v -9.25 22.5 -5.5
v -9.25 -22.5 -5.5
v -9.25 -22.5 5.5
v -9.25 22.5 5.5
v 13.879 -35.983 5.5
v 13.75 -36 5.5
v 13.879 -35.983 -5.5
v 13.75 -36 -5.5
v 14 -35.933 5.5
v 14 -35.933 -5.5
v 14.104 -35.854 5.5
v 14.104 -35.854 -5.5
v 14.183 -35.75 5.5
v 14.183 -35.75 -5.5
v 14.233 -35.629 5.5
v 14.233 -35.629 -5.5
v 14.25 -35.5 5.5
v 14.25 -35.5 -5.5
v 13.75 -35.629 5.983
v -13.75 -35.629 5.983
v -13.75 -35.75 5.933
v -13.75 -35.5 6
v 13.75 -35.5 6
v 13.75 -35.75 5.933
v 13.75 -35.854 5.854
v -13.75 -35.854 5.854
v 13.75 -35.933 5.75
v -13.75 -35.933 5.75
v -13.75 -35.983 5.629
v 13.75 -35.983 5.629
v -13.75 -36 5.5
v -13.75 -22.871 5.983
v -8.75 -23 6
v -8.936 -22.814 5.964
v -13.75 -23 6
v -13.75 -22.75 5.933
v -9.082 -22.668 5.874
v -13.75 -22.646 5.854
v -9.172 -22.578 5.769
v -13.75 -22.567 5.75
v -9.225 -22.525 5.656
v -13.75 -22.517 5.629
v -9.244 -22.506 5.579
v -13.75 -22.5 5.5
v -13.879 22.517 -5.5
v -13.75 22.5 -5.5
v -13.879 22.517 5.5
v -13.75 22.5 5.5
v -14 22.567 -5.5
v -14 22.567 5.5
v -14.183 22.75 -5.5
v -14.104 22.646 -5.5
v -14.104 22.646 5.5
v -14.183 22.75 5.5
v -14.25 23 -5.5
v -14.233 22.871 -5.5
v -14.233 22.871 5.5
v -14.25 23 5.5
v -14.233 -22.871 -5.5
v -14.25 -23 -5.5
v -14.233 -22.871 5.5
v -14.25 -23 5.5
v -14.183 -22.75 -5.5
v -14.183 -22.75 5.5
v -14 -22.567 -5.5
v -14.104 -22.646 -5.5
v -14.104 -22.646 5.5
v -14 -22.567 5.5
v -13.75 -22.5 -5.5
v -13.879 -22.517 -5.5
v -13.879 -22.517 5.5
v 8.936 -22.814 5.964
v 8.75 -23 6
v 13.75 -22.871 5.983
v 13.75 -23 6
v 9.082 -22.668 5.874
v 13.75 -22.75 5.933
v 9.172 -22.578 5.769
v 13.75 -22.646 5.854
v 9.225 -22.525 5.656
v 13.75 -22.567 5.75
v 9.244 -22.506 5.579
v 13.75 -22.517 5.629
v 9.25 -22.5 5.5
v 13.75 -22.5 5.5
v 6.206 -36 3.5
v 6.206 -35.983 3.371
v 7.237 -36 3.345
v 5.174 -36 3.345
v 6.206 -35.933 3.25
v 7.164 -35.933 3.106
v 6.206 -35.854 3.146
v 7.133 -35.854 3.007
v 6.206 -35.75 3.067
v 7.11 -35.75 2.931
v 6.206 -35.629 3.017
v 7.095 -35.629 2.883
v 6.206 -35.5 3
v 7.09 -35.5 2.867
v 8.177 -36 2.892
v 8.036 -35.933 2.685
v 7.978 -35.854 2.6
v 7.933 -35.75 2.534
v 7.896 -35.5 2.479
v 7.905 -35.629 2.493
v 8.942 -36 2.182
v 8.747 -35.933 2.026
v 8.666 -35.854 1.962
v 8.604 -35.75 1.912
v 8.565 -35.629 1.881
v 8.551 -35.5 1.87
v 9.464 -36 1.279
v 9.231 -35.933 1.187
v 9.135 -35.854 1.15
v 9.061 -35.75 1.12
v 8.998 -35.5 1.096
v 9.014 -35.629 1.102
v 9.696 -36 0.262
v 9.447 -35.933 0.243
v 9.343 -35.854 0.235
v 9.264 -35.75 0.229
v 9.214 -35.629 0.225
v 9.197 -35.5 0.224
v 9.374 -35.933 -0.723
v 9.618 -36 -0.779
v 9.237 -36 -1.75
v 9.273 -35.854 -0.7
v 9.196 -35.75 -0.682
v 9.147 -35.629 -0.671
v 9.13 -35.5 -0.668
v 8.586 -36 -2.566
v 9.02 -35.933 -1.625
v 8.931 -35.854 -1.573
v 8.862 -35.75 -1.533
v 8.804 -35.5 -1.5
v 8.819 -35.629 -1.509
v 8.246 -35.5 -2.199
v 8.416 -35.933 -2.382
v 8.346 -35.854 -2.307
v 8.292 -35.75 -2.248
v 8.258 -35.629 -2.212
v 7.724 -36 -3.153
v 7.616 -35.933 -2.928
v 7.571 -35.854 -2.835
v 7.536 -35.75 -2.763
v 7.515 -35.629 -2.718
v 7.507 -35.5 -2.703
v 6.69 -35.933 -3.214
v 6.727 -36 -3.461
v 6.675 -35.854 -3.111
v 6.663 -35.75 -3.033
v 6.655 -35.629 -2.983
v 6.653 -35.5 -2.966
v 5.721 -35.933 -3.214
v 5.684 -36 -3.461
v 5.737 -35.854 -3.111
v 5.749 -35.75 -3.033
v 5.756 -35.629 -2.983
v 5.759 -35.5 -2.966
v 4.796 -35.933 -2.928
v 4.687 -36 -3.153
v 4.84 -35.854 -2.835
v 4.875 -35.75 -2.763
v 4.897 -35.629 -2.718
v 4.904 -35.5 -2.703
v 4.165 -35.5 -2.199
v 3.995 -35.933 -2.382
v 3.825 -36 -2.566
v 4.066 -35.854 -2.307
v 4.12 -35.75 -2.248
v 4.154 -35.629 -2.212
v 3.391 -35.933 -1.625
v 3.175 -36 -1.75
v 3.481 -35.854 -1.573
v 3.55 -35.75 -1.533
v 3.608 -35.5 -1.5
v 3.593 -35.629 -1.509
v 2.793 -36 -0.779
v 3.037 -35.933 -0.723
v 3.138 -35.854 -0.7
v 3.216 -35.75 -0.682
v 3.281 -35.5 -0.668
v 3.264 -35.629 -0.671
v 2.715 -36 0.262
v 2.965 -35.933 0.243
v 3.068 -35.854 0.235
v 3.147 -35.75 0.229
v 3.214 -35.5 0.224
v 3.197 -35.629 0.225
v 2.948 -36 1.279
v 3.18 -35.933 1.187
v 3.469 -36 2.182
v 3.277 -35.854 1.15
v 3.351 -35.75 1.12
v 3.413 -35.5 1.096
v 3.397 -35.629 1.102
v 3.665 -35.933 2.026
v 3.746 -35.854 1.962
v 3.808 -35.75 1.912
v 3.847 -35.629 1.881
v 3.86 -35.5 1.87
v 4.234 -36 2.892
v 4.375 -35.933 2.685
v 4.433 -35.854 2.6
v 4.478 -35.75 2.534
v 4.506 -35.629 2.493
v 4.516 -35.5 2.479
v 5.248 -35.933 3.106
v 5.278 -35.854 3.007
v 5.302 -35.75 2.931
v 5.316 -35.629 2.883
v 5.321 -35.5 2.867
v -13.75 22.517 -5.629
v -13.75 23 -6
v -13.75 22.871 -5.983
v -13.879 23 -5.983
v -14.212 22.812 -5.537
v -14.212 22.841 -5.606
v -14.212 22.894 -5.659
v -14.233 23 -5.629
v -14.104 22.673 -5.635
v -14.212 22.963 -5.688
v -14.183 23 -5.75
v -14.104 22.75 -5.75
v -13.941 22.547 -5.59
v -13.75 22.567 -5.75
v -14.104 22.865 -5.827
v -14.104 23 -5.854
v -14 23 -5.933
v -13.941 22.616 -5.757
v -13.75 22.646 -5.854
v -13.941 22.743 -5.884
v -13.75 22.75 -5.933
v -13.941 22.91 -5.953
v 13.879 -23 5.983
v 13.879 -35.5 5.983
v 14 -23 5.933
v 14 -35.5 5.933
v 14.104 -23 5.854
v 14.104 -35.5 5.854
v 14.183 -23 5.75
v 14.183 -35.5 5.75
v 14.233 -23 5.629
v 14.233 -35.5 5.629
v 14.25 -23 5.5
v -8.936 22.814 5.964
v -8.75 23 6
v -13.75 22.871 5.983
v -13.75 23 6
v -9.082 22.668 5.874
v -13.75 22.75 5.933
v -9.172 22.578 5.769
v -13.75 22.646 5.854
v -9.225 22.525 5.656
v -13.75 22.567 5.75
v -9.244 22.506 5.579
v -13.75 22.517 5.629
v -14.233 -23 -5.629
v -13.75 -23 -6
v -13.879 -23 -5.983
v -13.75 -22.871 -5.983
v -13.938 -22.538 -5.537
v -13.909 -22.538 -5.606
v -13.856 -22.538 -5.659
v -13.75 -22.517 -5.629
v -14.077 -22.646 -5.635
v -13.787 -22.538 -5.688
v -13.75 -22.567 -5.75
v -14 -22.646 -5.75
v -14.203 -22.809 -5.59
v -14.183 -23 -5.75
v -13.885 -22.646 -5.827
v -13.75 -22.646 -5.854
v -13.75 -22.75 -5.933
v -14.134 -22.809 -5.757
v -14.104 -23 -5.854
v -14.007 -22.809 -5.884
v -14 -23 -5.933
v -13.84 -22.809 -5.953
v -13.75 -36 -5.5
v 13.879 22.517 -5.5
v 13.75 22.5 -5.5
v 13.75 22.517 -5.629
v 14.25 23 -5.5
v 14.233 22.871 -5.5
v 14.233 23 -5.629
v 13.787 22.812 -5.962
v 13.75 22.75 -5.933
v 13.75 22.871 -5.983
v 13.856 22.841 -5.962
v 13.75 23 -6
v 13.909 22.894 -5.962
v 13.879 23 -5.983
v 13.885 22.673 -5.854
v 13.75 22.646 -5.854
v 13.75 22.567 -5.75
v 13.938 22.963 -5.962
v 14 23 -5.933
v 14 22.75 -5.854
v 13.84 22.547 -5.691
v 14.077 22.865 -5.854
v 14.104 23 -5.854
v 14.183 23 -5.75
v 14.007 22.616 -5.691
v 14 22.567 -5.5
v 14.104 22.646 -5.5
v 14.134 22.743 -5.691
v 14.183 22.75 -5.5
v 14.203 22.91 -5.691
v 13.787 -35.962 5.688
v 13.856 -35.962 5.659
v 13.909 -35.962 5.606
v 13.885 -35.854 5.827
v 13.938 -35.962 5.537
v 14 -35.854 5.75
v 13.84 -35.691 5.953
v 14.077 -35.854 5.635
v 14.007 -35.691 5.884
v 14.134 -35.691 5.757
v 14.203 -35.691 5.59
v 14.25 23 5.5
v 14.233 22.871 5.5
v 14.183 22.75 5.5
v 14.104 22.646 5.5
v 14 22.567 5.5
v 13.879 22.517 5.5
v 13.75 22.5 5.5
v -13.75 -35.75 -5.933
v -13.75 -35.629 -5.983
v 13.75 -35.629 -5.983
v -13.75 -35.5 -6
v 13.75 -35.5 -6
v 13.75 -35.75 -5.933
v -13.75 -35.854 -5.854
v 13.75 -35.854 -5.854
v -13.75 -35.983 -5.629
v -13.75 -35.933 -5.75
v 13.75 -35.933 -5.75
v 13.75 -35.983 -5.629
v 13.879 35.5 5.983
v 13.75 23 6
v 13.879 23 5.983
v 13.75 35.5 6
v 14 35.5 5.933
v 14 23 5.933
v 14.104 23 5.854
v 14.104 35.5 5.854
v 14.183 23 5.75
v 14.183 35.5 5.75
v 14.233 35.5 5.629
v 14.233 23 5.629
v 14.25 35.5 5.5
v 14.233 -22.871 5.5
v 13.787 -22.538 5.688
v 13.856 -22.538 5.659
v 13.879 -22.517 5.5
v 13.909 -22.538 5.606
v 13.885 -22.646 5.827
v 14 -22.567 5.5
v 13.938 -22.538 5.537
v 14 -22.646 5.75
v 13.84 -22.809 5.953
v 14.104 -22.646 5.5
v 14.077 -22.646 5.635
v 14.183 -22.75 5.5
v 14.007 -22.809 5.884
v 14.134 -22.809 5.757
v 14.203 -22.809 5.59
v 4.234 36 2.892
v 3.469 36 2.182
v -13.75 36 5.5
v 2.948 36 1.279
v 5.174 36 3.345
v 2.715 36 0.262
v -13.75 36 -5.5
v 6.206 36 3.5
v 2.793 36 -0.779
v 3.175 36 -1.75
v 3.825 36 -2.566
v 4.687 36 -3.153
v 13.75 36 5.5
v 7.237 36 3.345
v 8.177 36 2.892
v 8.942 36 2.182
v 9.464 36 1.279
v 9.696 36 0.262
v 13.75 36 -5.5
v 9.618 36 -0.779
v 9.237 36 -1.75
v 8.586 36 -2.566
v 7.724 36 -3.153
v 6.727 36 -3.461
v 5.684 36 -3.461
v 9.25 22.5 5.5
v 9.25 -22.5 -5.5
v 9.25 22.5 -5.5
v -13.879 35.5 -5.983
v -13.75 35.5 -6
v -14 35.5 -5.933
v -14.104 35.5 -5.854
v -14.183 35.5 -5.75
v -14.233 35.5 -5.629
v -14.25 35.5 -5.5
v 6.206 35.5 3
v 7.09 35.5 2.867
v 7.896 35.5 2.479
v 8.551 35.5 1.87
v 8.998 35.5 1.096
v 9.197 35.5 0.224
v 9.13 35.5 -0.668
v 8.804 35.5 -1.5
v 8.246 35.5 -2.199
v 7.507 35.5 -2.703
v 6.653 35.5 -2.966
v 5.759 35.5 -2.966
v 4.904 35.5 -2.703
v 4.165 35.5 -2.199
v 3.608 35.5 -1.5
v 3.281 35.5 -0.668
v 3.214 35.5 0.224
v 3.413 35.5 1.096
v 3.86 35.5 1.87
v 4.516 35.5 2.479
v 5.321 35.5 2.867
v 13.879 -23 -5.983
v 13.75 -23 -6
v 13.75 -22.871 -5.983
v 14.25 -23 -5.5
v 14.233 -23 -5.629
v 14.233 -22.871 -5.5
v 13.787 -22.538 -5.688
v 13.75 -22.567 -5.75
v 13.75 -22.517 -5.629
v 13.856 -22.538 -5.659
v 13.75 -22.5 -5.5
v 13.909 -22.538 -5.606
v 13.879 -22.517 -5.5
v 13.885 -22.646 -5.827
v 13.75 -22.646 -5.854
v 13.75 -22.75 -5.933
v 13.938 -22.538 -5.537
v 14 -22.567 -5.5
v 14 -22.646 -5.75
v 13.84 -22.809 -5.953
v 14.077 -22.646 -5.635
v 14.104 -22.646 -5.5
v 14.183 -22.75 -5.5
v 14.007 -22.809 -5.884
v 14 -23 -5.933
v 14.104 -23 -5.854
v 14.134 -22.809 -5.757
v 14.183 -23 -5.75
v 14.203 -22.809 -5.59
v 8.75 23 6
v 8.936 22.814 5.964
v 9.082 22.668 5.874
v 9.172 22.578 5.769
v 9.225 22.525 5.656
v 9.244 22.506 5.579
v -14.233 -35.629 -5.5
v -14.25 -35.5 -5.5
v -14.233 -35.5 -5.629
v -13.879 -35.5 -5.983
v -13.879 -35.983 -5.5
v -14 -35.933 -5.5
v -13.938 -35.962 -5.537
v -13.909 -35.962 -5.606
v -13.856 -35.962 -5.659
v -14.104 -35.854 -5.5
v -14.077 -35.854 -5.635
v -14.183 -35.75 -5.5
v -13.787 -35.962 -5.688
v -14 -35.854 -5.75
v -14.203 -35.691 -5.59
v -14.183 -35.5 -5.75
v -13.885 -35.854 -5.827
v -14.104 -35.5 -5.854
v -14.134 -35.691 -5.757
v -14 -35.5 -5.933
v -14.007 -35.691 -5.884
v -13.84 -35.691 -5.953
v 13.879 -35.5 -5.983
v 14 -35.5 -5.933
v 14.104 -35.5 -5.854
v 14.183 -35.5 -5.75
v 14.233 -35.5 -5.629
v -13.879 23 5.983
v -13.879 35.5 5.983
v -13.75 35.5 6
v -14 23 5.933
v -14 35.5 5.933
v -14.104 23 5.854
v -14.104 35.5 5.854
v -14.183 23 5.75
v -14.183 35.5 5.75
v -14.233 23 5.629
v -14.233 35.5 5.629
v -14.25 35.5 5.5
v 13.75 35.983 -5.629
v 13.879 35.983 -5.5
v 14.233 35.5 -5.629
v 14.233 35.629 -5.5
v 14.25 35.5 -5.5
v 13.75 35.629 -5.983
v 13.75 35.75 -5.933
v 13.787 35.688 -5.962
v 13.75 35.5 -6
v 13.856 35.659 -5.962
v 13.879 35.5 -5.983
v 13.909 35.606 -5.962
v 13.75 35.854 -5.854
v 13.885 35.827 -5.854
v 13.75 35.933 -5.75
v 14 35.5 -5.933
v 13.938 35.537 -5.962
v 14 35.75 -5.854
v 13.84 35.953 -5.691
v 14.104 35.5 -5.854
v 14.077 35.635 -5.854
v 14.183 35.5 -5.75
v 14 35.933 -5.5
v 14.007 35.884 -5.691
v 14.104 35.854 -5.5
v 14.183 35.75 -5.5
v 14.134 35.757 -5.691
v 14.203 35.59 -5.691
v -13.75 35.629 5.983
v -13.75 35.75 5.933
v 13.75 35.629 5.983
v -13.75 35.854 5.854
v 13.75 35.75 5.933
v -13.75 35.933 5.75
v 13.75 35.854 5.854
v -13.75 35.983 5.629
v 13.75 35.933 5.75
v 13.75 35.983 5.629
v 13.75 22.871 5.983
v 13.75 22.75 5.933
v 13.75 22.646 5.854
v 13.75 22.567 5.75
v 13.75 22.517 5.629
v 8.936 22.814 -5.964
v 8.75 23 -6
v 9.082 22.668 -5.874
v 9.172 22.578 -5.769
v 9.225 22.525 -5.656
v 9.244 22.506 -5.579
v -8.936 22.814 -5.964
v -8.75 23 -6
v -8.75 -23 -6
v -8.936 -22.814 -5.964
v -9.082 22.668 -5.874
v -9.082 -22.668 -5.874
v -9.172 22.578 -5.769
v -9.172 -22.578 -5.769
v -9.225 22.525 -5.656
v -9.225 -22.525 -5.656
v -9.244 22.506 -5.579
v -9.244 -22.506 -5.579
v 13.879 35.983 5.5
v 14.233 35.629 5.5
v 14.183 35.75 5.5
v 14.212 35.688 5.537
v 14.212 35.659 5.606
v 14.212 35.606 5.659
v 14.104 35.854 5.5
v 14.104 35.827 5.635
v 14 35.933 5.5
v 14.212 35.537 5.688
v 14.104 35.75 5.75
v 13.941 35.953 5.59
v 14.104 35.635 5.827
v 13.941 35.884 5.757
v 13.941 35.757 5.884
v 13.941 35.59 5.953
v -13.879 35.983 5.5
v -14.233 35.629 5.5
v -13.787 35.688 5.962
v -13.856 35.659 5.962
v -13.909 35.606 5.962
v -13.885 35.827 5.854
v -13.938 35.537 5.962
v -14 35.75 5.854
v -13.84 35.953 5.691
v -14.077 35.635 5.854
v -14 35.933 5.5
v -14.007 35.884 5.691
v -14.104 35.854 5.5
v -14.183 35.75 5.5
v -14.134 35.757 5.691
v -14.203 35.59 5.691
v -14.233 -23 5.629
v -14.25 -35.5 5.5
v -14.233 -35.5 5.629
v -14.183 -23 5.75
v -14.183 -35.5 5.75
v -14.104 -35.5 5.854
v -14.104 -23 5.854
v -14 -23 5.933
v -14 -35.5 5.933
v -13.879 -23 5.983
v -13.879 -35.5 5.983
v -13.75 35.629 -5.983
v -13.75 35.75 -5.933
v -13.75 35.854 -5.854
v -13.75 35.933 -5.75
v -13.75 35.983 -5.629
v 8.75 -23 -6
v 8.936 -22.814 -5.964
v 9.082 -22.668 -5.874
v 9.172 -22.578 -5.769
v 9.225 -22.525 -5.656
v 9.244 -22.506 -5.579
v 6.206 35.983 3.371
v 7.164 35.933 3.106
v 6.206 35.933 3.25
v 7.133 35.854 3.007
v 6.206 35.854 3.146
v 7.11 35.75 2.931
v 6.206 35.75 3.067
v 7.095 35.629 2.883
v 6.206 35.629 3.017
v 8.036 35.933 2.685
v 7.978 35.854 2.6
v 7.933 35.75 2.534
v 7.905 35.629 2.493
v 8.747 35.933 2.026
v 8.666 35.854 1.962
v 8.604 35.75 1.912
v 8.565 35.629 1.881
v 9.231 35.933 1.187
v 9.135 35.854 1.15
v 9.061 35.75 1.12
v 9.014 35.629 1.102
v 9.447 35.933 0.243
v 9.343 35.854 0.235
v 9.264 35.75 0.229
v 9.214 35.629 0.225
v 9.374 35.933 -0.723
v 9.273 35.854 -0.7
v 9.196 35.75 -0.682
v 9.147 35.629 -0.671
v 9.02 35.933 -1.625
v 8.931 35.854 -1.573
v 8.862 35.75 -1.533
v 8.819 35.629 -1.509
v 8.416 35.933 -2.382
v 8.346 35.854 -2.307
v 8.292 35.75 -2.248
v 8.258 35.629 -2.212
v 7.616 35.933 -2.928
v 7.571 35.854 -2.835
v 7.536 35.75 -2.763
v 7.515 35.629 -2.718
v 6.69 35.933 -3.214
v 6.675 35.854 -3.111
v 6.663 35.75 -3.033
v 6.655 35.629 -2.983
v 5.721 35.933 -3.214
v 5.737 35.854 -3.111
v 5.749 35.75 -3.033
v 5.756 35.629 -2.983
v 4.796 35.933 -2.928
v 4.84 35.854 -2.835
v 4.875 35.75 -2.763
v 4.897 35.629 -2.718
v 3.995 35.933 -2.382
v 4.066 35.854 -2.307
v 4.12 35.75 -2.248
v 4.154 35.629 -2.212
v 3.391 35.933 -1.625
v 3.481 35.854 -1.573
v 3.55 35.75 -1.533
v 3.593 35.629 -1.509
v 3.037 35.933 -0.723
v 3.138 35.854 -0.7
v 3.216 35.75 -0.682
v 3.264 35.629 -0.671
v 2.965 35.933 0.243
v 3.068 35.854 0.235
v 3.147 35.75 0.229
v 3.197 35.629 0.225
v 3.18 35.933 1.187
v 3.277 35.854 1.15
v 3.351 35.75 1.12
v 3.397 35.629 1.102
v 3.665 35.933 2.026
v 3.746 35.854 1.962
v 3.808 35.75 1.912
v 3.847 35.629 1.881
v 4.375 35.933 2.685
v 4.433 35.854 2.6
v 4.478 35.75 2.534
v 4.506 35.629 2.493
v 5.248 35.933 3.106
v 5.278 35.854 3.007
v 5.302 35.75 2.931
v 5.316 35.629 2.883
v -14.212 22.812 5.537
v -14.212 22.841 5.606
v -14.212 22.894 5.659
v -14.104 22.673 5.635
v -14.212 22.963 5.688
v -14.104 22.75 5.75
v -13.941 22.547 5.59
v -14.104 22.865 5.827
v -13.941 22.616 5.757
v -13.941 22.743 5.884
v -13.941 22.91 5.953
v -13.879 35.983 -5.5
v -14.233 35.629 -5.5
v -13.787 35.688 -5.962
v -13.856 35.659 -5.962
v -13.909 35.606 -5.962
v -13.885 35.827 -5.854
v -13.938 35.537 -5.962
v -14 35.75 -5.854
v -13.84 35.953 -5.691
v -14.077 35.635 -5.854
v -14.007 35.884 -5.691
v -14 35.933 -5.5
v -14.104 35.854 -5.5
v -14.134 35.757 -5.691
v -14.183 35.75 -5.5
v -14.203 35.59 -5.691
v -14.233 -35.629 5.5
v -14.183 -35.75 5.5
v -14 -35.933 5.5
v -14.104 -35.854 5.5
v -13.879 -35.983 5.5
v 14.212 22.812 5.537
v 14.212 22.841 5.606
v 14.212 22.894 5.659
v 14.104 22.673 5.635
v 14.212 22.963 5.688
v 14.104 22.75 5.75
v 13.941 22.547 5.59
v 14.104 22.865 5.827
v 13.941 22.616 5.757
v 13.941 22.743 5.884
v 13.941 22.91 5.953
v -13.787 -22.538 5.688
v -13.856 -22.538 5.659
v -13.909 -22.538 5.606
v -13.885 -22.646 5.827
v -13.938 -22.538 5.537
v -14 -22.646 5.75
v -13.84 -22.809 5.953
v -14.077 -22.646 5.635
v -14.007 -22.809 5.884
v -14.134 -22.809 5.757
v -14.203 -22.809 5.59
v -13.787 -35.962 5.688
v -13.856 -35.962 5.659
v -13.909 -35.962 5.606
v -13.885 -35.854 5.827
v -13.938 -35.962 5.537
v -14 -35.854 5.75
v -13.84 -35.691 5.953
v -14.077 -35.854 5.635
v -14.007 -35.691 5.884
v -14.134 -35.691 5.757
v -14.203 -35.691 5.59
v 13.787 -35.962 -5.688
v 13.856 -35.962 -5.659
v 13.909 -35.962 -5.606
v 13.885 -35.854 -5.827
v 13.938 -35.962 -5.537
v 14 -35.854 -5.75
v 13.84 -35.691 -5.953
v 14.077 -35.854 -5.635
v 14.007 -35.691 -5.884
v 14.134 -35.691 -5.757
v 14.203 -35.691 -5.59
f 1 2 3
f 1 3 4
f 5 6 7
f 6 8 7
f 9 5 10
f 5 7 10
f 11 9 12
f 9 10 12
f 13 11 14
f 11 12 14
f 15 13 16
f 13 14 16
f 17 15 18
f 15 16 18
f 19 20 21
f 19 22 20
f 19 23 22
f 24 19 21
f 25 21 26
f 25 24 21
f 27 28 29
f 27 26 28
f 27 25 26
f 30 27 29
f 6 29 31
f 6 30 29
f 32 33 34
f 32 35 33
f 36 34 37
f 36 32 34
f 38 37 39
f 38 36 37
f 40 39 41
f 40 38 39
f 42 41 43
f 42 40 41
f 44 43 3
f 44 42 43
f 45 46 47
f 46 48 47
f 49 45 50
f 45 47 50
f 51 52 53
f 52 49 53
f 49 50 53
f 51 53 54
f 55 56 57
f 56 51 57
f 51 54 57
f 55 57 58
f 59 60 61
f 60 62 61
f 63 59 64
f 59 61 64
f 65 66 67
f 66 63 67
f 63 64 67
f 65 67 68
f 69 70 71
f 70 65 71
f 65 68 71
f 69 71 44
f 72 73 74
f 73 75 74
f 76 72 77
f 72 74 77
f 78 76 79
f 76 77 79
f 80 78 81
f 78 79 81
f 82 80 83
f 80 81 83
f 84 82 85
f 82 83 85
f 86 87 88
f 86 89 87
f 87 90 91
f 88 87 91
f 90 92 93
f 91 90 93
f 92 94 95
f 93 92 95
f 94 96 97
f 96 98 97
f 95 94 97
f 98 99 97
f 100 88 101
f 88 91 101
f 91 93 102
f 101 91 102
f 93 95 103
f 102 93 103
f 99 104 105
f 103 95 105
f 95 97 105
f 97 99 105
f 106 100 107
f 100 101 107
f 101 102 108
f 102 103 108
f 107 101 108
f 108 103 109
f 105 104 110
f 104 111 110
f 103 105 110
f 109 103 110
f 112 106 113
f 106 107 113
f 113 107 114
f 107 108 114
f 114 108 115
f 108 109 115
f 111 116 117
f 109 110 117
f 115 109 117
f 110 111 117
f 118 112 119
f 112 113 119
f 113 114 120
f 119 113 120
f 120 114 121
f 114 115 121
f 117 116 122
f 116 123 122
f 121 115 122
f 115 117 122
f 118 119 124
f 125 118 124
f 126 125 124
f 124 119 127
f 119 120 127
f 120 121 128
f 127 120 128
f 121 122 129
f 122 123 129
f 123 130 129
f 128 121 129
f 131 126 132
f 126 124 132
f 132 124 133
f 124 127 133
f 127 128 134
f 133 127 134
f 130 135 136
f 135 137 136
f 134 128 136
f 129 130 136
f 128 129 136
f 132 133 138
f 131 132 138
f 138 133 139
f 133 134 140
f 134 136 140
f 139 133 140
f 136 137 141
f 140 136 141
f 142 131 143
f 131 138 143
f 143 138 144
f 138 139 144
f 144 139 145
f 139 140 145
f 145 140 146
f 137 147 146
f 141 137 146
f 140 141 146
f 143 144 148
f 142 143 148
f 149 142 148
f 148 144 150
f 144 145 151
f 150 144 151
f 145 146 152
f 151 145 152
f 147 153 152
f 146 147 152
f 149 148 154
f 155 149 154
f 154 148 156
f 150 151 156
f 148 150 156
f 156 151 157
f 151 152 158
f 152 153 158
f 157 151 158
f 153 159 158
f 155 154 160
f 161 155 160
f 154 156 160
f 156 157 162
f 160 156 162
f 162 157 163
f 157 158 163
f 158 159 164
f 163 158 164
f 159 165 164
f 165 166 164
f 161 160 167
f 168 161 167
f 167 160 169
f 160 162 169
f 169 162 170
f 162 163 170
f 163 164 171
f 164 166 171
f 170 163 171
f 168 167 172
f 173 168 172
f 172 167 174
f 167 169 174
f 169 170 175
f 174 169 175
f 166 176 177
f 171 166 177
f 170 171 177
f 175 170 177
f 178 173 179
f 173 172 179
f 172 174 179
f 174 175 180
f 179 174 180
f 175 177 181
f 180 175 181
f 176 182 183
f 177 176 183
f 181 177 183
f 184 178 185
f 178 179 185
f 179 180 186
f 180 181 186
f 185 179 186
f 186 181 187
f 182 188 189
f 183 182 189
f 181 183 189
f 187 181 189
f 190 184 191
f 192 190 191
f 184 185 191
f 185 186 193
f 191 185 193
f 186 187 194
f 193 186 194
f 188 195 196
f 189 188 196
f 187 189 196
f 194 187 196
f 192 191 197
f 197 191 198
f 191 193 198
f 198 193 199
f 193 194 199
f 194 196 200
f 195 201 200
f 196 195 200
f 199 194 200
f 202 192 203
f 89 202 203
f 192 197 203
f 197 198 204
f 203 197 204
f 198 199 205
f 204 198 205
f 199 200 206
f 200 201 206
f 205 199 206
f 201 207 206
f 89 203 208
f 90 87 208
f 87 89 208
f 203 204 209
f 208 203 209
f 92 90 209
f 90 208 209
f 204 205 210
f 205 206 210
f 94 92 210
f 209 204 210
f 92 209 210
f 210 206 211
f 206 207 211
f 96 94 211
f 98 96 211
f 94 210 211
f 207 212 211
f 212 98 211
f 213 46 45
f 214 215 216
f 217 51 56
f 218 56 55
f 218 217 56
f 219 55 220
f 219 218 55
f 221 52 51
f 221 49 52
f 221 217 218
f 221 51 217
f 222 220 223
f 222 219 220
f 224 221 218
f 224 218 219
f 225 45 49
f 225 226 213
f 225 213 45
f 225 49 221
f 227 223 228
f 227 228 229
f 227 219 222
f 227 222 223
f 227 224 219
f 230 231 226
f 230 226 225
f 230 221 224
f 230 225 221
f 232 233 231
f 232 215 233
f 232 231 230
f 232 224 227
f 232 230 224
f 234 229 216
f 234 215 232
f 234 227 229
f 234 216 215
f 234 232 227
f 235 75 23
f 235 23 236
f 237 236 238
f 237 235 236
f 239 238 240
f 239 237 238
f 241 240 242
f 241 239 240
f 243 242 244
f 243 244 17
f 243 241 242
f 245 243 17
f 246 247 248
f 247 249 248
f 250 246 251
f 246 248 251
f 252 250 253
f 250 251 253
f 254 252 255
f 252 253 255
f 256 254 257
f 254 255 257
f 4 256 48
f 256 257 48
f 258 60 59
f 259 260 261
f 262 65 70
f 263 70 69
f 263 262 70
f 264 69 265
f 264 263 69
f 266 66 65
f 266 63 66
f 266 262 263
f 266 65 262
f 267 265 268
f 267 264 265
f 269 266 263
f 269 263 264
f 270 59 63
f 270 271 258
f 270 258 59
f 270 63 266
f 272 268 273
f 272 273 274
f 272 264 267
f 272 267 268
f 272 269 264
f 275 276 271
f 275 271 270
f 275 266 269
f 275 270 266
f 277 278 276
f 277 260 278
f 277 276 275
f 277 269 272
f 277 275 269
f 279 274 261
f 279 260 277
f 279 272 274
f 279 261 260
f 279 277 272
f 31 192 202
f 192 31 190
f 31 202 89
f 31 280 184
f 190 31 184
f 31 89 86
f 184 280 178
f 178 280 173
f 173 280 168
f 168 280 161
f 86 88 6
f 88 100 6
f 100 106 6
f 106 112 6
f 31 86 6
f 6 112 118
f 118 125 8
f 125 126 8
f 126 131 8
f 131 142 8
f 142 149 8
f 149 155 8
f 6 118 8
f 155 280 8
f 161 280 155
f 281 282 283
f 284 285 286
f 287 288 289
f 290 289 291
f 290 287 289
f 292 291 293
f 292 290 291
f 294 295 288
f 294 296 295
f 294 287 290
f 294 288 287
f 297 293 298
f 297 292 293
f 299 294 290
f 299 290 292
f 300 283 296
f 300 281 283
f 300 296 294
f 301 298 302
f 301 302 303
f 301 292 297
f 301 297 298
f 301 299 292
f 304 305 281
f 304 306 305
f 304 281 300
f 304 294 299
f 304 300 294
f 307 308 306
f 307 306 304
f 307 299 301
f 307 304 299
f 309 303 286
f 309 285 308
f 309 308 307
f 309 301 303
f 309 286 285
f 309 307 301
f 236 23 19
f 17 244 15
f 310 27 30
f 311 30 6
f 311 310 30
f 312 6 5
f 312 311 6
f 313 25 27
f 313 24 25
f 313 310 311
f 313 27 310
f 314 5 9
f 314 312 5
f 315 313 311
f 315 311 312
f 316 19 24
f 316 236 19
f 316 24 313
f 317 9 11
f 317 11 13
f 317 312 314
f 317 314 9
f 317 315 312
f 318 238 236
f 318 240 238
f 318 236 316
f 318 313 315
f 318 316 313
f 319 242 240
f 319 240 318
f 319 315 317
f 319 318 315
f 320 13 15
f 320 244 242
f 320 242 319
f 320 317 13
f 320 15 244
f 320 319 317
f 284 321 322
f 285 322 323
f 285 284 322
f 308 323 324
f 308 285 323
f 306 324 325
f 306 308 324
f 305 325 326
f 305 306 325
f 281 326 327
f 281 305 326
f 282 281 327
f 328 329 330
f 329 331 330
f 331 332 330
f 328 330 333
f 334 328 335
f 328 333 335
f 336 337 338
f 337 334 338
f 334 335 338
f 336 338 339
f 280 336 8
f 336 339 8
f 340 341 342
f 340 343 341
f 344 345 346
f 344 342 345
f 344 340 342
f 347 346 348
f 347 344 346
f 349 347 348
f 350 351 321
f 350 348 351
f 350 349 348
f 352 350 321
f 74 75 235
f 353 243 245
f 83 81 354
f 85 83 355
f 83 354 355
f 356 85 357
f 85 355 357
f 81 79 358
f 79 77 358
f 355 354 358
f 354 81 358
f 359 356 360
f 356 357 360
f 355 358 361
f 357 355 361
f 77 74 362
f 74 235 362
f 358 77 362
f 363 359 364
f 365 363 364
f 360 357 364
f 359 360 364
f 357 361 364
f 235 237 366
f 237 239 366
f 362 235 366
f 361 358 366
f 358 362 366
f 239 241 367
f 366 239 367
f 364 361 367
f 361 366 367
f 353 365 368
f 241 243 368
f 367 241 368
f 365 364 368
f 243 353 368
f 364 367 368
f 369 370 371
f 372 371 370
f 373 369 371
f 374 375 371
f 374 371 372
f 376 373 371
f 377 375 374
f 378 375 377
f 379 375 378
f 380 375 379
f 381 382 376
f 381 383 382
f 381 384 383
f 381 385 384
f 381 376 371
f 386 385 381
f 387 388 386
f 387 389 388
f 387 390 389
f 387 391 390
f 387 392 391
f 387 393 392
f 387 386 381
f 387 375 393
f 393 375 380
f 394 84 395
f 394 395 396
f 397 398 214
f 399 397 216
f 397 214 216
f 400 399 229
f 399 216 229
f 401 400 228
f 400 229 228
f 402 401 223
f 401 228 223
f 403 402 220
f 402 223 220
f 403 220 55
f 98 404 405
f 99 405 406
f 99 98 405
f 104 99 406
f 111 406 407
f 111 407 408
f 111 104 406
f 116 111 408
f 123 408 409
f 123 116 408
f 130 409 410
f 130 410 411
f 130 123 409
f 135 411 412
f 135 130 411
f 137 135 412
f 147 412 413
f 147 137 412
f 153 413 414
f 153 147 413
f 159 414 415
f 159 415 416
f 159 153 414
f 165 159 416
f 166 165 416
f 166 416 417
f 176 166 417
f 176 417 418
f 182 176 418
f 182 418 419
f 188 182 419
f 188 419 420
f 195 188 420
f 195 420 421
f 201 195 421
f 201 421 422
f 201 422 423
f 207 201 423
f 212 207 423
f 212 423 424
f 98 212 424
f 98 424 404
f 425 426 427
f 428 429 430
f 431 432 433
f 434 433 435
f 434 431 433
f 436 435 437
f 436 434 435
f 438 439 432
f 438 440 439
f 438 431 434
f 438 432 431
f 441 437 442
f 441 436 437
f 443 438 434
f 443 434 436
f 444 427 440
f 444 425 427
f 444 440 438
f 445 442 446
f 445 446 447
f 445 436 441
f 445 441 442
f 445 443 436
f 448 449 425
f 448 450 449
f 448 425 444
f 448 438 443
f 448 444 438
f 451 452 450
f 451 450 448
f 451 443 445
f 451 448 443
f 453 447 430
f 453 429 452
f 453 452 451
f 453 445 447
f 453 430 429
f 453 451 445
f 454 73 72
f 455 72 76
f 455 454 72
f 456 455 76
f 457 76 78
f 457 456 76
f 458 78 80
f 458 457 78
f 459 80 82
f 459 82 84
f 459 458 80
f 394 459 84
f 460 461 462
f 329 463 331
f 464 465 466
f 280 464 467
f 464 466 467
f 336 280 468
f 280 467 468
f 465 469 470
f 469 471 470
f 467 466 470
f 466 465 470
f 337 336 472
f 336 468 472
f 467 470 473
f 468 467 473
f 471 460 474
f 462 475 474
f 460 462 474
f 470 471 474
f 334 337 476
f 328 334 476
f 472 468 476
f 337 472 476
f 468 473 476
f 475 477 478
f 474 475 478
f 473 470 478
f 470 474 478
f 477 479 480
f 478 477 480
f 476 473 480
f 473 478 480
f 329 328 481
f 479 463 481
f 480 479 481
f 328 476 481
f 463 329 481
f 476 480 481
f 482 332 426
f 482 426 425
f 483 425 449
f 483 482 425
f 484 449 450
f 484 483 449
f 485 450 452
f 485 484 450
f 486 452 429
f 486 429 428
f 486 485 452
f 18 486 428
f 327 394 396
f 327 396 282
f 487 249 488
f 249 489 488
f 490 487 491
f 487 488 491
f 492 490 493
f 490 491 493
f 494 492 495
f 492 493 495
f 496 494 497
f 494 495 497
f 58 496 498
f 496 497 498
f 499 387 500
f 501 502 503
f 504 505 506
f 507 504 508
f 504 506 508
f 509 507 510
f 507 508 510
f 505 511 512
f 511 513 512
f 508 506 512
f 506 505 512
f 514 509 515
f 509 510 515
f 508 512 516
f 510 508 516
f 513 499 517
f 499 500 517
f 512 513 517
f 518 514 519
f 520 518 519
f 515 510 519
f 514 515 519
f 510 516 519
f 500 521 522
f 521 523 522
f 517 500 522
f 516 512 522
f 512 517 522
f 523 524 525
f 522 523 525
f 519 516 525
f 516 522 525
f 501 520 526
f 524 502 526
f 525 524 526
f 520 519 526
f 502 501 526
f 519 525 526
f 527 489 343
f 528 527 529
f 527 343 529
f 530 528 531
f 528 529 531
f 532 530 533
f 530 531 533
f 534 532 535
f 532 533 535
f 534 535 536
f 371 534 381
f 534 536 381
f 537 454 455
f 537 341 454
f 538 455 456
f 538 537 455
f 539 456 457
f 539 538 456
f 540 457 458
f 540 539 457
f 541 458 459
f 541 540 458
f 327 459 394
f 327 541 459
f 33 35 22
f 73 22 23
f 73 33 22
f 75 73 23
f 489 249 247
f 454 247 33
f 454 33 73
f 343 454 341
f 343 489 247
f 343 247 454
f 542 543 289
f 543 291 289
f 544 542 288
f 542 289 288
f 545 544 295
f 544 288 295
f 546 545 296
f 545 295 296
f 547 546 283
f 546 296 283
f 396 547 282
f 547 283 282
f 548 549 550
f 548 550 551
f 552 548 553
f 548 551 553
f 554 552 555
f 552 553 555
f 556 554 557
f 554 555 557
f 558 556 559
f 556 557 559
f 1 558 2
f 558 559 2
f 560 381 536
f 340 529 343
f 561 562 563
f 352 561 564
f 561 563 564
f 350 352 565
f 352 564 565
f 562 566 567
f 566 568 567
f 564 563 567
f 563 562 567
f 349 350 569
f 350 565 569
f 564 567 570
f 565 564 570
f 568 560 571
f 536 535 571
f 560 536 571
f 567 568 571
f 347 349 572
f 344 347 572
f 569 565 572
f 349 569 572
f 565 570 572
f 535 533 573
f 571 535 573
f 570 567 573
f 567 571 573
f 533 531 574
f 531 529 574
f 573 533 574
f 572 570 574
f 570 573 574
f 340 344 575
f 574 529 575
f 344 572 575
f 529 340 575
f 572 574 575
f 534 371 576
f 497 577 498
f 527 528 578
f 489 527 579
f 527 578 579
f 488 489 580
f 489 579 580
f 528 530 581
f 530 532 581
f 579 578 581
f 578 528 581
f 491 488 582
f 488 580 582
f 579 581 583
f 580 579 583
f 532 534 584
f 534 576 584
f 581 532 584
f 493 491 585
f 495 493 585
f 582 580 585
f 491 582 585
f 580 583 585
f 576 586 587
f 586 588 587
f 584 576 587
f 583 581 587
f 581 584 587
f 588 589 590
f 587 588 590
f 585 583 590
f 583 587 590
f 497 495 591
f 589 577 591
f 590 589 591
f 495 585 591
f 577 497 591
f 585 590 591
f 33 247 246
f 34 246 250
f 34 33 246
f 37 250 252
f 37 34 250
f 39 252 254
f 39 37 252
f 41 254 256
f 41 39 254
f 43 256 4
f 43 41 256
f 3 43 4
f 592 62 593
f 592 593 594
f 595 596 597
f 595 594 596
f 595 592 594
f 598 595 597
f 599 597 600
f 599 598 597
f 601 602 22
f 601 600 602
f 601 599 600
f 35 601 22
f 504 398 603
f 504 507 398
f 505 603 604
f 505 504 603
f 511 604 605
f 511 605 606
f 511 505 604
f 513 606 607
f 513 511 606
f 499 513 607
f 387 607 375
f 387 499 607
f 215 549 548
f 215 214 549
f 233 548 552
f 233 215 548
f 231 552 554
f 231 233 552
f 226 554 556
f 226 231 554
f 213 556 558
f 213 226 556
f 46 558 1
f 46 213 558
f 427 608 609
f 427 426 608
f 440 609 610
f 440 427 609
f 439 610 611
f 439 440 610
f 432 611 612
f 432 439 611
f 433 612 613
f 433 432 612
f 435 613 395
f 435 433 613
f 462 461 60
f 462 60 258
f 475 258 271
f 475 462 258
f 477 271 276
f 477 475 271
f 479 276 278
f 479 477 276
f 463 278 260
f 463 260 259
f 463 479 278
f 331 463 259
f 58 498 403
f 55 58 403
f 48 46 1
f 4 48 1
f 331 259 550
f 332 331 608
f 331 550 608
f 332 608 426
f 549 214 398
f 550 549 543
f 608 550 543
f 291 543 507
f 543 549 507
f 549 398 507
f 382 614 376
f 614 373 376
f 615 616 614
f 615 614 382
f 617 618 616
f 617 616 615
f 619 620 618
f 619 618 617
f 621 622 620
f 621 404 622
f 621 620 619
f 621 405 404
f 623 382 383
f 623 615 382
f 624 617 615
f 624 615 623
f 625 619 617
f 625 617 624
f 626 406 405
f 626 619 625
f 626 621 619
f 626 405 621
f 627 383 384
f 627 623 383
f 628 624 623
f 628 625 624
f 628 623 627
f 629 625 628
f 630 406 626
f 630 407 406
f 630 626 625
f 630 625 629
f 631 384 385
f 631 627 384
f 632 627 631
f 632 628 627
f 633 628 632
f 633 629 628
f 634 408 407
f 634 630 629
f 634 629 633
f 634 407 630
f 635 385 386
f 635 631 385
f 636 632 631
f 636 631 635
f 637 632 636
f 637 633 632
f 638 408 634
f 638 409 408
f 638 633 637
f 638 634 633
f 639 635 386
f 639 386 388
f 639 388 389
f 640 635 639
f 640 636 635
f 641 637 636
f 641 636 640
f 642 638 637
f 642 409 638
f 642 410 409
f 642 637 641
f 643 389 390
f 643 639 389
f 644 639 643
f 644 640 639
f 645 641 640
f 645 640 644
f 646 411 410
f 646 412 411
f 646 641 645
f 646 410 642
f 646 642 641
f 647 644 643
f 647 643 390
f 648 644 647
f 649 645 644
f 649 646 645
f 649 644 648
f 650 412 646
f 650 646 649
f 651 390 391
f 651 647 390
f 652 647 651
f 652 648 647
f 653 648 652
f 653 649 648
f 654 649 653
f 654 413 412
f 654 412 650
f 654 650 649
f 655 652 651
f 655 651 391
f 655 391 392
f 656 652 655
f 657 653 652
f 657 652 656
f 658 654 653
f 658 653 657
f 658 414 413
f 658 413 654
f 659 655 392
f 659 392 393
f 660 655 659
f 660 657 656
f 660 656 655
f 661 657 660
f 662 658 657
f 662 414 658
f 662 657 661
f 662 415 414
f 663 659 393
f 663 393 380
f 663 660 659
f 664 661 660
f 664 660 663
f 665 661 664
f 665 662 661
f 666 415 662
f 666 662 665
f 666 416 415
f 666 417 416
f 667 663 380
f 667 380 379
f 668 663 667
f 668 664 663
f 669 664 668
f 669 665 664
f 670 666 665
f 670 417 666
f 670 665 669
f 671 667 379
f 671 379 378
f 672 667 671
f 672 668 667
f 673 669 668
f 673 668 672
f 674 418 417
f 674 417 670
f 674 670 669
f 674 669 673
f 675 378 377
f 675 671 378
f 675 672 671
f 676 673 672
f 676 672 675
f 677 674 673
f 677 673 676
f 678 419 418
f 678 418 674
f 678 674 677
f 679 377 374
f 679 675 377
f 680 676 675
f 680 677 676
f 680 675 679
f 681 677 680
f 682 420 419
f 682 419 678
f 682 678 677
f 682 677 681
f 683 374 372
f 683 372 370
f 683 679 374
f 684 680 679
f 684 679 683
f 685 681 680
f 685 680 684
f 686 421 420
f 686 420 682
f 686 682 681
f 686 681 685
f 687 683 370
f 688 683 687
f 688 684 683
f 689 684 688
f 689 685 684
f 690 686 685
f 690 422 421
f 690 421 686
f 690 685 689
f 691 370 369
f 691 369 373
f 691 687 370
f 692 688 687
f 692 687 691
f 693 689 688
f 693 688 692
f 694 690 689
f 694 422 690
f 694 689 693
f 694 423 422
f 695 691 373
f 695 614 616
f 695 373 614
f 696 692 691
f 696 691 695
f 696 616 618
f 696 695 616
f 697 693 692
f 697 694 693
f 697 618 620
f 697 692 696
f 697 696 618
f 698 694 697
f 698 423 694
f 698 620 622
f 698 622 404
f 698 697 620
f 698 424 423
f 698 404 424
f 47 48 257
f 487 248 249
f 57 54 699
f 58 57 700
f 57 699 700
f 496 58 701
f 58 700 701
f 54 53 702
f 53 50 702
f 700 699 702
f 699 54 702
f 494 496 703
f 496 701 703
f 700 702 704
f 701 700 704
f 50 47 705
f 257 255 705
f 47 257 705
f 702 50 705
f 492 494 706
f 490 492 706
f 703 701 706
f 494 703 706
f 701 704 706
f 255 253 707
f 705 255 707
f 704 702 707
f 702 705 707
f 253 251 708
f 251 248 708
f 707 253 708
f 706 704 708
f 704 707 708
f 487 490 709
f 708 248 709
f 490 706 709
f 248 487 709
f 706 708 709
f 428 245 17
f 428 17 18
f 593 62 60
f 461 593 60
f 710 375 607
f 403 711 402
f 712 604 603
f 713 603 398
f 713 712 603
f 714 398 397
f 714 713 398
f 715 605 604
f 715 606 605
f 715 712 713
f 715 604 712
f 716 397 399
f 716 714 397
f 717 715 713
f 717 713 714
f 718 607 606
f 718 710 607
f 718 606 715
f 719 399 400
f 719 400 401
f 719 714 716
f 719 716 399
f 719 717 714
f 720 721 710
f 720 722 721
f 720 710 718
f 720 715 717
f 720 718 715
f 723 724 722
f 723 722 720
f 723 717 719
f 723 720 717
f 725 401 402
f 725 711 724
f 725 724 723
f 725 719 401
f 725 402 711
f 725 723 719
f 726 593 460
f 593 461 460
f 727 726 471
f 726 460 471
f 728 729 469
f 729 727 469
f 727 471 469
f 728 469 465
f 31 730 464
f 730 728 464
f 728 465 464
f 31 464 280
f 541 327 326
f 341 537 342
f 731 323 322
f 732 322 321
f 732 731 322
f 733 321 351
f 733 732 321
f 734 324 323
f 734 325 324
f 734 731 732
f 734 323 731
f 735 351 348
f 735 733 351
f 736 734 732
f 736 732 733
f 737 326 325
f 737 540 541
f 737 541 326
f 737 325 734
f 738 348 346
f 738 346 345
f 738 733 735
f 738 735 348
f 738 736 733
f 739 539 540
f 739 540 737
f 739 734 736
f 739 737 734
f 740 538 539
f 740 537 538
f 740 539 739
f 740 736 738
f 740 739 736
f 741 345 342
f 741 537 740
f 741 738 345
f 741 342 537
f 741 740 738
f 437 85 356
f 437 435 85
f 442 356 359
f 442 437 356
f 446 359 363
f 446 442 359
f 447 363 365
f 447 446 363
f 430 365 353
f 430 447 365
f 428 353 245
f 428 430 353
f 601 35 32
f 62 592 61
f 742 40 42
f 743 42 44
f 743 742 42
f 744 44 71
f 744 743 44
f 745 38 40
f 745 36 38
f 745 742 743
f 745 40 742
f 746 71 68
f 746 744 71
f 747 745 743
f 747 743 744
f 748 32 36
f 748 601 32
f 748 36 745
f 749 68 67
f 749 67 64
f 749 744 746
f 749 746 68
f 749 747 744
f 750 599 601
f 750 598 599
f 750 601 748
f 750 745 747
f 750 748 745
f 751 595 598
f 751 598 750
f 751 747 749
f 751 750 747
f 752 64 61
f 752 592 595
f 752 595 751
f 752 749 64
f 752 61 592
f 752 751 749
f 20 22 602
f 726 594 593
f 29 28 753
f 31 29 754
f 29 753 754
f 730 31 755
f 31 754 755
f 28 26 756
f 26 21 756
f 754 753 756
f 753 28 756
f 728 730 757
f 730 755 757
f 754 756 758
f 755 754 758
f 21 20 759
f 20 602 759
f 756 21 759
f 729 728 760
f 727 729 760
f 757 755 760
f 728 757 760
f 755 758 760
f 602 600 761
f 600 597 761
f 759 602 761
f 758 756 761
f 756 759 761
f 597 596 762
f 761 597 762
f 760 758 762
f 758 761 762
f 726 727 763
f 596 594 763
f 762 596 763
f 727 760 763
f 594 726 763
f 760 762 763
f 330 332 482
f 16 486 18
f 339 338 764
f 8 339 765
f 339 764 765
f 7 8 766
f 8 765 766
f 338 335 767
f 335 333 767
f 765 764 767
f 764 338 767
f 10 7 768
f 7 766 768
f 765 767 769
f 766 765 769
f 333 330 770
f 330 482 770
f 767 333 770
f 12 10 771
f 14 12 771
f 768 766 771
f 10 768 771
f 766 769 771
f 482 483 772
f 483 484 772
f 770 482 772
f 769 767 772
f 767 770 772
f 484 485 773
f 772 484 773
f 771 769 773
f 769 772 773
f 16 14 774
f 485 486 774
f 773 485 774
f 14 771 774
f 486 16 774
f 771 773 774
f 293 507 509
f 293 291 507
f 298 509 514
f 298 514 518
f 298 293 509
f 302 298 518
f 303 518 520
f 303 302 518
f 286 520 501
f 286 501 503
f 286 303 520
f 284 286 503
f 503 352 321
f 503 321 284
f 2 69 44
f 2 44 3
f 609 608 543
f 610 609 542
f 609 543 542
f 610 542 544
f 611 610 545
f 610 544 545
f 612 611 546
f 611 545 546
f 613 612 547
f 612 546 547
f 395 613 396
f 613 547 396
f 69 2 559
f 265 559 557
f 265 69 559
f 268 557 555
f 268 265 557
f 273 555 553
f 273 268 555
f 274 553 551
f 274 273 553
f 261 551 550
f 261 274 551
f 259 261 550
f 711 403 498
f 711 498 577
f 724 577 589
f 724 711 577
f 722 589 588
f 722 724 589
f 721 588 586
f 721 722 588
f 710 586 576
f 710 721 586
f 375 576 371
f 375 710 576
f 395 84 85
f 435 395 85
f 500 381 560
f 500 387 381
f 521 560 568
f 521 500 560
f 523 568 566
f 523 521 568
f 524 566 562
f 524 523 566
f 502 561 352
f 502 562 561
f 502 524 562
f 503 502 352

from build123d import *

# Parameters (mm, degrees)
ESBO_O1_W                = 28.5
ESBO_O1_H                = 12
ESBO_O1_R                = 3
RESSALTO_EXTRUS_O1_DEPTH = 36
ESBO_O2_W                = 10
ESBO_O2_H                = 45
CORTE_EXTRUS_O1_DEPTH    = 10
FILETE1_R                = 0.5


with BuildPart() as part:
    # Esboço1 → Ressalto-extrusão1 (new, symmetric)
    with BuildSketch(Plane(origin=(0, 0, 0), x_dir=(1, 0, 0), z_dir=(0, 1, 0))):
        Rectangle(ESBO_O1_W, ESBO_O1_H)
        with Locations(Location((6.205688, 0, 0), (0, 0, 270))):
            Circle(ESBO_O1_R, mode=Mode.SUBTRACT)
    extrude(amount=RESSALTO_EXTRUS_O1_DEPTH, both=True)

    # Esboço2 → Corte-extrusão1 (cut, symmetric)
    with BuildSketch(Plane.XY):
        with Locations((-14.25, 0)):
            Rectangle(ESBO_O2_W, ESBO_O2_H)
        with Locations((14.25, 0)):
            Rectangle(ESBO_O2_W, ESBO_O2_H)
    extrude(amount=CORTE_EXTRUS_O1_DEPTH, both=True, mode=Mode.SUBTRACT)

    # Filete1
    filete1_edges = [part.edges().sort_by_distance(p)[0] for p in [
        (-14.25, 36, 0),
        (6.205688, -36, -3),
        (6.205688, 36, -3),
        (0, 36, 6),
        (-14.25, -29.25, 6),
        (-11.75, 22.5, 6),
        (-9.25, 0, 6),
        (-11.75, -22.5, 6),
        (-14.25, -29.25, -6),
        (-9.25, 0, -6),
        (-14.25, -22.5, 0),
        (-11.75, -22.5, -6),
        (-11.75, 22.5, -6),
        (-14.25, 22.5, 0),
        (14.25, -29.25, 6),
        (11.75, 22.5, 6),
        (9.25, 0, 6),
        (11.75, -22.5, 6),
        (14.25, -29.25, -6),
        (11.75, -22.5, -6),
        (14.25, 36, 0),
        (14.25, -22.5, 0),
        (9.25, 0, -6),
        (14.25, 22.5, 0),
        (11.75, 22.5, -6),
        (0, -36, 6),
        (-14.25, -36, 0),
        (0, -36, -6),
        (14.25, -36, 0),
        (0, 36, -6),
        (14.25, 29.25, 6),
        (-14.25, 29.25, 6),
        (-14.25, 29.25, -6),
        (14.25, 29.25, -6),
    ]]
    fillet(filete1_edges, radius=FILETE1_R)


solid = part.part
